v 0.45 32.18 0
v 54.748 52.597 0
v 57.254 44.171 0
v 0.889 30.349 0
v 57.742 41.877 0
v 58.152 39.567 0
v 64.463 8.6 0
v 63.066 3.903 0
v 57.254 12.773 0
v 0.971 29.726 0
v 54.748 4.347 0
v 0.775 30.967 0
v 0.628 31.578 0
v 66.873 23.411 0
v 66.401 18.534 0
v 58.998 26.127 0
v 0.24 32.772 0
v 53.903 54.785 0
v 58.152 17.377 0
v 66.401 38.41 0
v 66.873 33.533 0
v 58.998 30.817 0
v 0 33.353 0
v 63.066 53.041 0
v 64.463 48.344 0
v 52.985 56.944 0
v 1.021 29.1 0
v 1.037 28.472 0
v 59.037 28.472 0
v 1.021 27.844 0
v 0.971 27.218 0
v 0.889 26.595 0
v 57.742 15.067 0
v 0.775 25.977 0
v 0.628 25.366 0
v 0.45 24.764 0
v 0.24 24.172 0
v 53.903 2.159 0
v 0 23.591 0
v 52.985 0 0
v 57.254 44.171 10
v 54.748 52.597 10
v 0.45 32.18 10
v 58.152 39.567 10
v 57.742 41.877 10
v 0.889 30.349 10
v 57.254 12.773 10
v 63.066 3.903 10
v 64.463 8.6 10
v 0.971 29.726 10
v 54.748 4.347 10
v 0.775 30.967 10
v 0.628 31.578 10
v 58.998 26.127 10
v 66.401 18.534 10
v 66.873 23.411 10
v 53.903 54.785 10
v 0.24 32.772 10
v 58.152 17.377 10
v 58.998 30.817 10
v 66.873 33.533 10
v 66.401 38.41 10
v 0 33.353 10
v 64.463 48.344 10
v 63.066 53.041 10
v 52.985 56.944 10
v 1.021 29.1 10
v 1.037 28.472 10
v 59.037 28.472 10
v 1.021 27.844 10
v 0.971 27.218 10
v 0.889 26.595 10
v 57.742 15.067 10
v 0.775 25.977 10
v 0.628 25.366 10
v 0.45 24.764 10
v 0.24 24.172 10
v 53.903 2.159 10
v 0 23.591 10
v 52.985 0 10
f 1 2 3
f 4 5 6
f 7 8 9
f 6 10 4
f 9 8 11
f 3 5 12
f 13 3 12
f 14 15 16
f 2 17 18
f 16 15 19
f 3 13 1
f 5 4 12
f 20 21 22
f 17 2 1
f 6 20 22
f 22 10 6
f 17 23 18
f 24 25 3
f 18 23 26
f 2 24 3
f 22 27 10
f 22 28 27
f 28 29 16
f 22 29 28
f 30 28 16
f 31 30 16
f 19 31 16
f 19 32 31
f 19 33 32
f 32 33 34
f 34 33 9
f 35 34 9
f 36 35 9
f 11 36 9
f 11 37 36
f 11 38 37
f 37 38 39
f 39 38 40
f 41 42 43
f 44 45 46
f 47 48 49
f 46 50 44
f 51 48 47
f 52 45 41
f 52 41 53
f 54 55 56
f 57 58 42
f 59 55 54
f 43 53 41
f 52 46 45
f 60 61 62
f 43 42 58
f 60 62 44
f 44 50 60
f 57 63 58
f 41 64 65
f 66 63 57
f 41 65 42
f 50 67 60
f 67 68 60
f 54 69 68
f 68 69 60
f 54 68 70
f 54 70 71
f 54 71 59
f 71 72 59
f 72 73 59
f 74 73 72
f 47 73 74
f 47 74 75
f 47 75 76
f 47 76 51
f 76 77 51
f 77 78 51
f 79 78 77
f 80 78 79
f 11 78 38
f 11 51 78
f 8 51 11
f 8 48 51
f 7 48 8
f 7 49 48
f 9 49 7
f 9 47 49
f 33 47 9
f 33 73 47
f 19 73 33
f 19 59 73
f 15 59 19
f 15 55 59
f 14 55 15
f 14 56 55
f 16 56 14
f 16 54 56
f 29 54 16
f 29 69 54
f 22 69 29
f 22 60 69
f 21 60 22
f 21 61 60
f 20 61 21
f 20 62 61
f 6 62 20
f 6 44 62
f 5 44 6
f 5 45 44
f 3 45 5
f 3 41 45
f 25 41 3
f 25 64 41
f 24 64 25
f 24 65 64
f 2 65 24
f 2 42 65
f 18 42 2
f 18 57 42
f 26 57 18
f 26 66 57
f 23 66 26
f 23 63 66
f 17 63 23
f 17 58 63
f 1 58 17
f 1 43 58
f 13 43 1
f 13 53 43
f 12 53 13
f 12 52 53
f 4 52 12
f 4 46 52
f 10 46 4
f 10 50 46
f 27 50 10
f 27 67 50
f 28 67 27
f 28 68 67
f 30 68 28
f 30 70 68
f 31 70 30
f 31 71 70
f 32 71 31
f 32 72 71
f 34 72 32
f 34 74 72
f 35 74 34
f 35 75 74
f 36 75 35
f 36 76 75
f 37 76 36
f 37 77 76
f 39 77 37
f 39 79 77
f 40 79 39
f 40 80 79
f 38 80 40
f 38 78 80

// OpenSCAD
$fn = 32;

// ----------------------------------------------------------------------
// Gear sector: 4 teeth on 48 degrees
// ----------------------------------------------------------------------

// --- parameters (mm) ---
sector_angle = 48;        // sector angle, degrees
root_r = 70;              // root circle radius
tooth_h = 8;              // tooth height over the root circle
teeth = 4;                // number of teeth on the sector
hub_r = 12;               // hub bore radius
plate_t = 10;             // sector thickness, Z
arc_step = 3;             // sampling step of the root/hub arcs, degrees

tip_r = root_r + tooth_h;  // tip circle radius

profile = [[52.985, 0], [53.903, 2.159], [54.748, 4.347], [63.066, 3.903], [64.463, 8.6], [57.254, 12.773], [57.742, 15.067], [58.152, 17.377], [66.401, 18.534], [66.873, 23.411], [58.998, 26.127], [59.037, 28.472], [58.998, 30.817], [66.873, 33.533], [66.401, 38.41], [58.152, 39.567], [57.742, 41.877], [57.254, 44.171], [64.463, 48.344], [63.066, 53.041], [54.748, 52.597], [53.903, 54.785], [52.985, 56.944], [0, 33.353], [0.24, 32.772], [0.45, 32.18], [0.628, 31.578], [0.775, 30.967], [0.889, 30.349], [0.971, 29.726], [1.021, 29.1], [1.037, 28.472], [1.021, 27.844], [0.971, 27.218], [0.889, 26.595], [0.775, 25.977], [0.628, 25.366], [0.45, 24.764], [0.24, 24.172], [0, 23.591]];  // primary outline, 40 points, counter clockwise

// --- the one profile operation ---
linear_extrude(height = plate_t) polygon(points = profile);
